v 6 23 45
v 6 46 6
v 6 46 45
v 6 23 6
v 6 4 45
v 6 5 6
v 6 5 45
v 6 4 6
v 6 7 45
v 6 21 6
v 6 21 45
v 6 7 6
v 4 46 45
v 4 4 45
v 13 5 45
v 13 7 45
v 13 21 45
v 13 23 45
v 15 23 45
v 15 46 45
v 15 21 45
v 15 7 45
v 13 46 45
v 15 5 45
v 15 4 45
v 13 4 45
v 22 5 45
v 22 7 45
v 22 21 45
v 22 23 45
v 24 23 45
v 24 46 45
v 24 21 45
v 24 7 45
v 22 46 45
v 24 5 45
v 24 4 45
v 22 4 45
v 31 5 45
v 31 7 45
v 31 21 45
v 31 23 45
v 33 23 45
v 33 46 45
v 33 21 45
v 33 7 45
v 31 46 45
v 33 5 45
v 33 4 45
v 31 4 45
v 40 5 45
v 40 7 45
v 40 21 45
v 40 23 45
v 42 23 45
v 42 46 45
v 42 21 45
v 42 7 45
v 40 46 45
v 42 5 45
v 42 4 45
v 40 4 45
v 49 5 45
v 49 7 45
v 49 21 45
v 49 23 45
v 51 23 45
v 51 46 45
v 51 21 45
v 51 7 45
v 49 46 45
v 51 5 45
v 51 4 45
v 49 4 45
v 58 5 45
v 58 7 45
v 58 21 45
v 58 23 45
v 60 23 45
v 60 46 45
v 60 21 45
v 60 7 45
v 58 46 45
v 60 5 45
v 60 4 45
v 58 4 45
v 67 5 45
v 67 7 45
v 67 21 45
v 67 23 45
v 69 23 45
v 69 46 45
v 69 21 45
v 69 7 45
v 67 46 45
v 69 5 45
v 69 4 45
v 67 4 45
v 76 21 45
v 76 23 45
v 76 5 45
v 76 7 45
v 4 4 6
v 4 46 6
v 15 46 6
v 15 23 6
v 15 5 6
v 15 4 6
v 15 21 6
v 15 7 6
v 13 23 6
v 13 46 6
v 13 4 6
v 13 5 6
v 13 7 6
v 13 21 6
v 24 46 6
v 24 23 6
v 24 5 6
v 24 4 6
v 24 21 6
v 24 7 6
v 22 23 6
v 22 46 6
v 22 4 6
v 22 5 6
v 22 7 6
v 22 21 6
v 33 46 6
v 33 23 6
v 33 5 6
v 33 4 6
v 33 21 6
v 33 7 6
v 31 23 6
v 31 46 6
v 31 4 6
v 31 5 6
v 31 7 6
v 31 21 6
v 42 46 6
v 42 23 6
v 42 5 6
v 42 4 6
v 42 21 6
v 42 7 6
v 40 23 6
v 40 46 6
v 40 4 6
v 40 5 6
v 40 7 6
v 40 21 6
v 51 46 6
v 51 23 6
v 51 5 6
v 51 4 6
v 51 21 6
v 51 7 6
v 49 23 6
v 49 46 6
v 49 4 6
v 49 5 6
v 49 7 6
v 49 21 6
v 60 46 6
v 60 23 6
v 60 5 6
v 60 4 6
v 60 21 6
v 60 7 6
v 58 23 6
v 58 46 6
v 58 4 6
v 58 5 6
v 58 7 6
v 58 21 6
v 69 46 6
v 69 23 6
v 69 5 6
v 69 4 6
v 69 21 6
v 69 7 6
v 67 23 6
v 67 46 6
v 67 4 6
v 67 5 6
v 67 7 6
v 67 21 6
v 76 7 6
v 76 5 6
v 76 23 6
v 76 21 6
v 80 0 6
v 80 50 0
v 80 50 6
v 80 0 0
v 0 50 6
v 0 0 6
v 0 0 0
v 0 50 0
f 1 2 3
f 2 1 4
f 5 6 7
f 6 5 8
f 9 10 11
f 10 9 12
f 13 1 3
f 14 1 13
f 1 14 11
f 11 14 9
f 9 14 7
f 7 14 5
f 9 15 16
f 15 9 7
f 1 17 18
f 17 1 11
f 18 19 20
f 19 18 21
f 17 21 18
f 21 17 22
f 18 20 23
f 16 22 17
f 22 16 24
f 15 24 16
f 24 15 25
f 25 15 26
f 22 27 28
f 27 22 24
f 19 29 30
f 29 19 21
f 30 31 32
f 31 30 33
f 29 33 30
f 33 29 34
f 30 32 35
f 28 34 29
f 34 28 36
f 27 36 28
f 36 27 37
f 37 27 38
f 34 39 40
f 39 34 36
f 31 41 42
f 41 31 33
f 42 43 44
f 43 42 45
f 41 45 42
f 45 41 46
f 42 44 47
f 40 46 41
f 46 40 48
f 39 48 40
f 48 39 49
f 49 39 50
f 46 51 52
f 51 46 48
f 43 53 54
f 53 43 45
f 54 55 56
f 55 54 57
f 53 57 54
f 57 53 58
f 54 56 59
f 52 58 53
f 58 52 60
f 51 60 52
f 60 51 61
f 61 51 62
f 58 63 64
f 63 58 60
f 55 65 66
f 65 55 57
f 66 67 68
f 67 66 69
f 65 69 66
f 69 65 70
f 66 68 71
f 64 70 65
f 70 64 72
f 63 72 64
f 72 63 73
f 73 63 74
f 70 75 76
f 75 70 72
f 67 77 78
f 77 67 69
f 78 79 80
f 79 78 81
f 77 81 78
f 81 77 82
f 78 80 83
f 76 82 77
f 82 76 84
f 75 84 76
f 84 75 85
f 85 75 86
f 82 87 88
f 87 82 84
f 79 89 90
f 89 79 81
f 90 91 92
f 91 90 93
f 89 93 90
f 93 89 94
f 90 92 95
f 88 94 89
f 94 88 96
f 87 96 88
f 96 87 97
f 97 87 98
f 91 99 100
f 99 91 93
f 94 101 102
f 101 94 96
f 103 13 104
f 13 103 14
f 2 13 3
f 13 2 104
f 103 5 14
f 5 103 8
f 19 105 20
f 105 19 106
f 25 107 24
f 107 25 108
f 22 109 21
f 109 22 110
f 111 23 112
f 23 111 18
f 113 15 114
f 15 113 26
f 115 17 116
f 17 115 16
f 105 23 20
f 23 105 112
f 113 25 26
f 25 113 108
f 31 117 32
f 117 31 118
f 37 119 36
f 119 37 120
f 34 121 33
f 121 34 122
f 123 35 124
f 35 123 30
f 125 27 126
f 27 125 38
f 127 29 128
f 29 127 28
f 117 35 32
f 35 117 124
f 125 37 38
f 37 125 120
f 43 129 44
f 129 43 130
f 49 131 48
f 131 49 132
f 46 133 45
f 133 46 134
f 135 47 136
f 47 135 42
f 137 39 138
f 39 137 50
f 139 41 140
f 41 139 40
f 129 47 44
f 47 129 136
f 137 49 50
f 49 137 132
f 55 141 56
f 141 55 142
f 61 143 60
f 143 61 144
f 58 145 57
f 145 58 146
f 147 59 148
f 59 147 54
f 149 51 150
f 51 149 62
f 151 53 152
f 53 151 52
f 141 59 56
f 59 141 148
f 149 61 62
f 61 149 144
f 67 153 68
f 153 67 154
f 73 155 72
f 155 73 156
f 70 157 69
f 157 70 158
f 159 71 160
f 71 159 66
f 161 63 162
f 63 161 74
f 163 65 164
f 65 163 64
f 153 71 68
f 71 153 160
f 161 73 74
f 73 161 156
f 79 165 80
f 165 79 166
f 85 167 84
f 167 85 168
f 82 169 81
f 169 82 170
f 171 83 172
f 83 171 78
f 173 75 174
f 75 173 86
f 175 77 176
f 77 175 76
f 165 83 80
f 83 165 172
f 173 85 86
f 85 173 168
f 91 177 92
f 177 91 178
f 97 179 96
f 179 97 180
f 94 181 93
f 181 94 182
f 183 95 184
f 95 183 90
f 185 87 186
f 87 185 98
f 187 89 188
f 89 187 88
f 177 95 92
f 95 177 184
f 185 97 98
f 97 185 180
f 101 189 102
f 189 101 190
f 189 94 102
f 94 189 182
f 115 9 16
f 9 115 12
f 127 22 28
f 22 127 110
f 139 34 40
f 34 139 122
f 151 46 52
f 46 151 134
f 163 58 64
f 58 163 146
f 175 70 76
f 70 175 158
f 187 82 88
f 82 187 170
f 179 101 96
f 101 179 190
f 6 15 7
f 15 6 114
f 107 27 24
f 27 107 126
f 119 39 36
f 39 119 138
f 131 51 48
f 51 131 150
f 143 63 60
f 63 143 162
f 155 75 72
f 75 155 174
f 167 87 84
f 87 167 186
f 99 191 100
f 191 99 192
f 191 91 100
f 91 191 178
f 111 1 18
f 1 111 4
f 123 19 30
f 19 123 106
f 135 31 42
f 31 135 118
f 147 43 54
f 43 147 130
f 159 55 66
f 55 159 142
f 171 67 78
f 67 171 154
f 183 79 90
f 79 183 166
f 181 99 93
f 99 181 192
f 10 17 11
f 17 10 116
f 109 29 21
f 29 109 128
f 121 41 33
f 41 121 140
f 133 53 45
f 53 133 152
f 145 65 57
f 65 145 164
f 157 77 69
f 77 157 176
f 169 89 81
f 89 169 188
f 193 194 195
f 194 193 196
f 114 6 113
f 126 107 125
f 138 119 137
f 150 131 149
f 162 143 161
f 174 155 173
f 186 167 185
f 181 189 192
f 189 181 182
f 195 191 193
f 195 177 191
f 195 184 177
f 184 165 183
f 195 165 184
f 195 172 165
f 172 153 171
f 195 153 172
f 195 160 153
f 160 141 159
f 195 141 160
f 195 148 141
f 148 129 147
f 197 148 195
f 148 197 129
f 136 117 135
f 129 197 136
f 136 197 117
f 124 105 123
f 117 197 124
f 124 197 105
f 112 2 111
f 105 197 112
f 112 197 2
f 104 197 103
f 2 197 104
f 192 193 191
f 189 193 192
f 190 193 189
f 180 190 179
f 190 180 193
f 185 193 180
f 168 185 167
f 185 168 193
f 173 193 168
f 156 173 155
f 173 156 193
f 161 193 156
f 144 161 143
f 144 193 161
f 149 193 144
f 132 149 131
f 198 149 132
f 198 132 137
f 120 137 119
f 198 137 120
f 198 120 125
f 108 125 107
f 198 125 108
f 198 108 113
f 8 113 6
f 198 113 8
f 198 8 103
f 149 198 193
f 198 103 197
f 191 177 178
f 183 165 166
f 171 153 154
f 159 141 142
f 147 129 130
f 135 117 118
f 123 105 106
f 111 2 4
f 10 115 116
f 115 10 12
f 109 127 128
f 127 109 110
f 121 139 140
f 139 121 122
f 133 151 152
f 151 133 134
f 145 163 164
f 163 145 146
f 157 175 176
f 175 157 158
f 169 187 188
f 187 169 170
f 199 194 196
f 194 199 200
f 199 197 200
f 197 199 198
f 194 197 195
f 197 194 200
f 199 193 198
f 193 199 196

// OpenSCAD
$fn = 32;

// ----------------------------------------------------------------------
// Heatsink: cross fin block
// ----------------------------------------------------------------------

// --- parameters (mm) ---
base_l = 80;              // base length, X
base_w = 50;              // base width, Y
base_t = 6;               // base plate thickness
fin_h = 40;               // fin height above the base
fin_t = 2;                // fin thickness
edge = 4;                 // margin from the base ends
pitch = 9;                // fin pitch
rib_pitch = 16;           // cross rib pitch

n_fins = floor((base_l - 2 * edge - fin_t) / pitch) + 1;  // fin count
total_h = base_t + fin_h - 1;  // overall height
n_ribs = floor((base_w - 2 * edge) / rib_pitch);  // rib count

union() {
  cube([base_l, base_w, base_t]);
  for (i = [0 : n_fins - 1])
    translate([edge + i * pitch, edge, base_t - 1])
      cube([fin_t, base_w - 2 * edge, fin_h]);
  for (i = [0 : n_ribs - 1])
    translate([edge, edge + 1 + i * rib_pitch, base_t - 1])
      cube([base_l - 2 * edge, fin_t, fin_h]);
}
